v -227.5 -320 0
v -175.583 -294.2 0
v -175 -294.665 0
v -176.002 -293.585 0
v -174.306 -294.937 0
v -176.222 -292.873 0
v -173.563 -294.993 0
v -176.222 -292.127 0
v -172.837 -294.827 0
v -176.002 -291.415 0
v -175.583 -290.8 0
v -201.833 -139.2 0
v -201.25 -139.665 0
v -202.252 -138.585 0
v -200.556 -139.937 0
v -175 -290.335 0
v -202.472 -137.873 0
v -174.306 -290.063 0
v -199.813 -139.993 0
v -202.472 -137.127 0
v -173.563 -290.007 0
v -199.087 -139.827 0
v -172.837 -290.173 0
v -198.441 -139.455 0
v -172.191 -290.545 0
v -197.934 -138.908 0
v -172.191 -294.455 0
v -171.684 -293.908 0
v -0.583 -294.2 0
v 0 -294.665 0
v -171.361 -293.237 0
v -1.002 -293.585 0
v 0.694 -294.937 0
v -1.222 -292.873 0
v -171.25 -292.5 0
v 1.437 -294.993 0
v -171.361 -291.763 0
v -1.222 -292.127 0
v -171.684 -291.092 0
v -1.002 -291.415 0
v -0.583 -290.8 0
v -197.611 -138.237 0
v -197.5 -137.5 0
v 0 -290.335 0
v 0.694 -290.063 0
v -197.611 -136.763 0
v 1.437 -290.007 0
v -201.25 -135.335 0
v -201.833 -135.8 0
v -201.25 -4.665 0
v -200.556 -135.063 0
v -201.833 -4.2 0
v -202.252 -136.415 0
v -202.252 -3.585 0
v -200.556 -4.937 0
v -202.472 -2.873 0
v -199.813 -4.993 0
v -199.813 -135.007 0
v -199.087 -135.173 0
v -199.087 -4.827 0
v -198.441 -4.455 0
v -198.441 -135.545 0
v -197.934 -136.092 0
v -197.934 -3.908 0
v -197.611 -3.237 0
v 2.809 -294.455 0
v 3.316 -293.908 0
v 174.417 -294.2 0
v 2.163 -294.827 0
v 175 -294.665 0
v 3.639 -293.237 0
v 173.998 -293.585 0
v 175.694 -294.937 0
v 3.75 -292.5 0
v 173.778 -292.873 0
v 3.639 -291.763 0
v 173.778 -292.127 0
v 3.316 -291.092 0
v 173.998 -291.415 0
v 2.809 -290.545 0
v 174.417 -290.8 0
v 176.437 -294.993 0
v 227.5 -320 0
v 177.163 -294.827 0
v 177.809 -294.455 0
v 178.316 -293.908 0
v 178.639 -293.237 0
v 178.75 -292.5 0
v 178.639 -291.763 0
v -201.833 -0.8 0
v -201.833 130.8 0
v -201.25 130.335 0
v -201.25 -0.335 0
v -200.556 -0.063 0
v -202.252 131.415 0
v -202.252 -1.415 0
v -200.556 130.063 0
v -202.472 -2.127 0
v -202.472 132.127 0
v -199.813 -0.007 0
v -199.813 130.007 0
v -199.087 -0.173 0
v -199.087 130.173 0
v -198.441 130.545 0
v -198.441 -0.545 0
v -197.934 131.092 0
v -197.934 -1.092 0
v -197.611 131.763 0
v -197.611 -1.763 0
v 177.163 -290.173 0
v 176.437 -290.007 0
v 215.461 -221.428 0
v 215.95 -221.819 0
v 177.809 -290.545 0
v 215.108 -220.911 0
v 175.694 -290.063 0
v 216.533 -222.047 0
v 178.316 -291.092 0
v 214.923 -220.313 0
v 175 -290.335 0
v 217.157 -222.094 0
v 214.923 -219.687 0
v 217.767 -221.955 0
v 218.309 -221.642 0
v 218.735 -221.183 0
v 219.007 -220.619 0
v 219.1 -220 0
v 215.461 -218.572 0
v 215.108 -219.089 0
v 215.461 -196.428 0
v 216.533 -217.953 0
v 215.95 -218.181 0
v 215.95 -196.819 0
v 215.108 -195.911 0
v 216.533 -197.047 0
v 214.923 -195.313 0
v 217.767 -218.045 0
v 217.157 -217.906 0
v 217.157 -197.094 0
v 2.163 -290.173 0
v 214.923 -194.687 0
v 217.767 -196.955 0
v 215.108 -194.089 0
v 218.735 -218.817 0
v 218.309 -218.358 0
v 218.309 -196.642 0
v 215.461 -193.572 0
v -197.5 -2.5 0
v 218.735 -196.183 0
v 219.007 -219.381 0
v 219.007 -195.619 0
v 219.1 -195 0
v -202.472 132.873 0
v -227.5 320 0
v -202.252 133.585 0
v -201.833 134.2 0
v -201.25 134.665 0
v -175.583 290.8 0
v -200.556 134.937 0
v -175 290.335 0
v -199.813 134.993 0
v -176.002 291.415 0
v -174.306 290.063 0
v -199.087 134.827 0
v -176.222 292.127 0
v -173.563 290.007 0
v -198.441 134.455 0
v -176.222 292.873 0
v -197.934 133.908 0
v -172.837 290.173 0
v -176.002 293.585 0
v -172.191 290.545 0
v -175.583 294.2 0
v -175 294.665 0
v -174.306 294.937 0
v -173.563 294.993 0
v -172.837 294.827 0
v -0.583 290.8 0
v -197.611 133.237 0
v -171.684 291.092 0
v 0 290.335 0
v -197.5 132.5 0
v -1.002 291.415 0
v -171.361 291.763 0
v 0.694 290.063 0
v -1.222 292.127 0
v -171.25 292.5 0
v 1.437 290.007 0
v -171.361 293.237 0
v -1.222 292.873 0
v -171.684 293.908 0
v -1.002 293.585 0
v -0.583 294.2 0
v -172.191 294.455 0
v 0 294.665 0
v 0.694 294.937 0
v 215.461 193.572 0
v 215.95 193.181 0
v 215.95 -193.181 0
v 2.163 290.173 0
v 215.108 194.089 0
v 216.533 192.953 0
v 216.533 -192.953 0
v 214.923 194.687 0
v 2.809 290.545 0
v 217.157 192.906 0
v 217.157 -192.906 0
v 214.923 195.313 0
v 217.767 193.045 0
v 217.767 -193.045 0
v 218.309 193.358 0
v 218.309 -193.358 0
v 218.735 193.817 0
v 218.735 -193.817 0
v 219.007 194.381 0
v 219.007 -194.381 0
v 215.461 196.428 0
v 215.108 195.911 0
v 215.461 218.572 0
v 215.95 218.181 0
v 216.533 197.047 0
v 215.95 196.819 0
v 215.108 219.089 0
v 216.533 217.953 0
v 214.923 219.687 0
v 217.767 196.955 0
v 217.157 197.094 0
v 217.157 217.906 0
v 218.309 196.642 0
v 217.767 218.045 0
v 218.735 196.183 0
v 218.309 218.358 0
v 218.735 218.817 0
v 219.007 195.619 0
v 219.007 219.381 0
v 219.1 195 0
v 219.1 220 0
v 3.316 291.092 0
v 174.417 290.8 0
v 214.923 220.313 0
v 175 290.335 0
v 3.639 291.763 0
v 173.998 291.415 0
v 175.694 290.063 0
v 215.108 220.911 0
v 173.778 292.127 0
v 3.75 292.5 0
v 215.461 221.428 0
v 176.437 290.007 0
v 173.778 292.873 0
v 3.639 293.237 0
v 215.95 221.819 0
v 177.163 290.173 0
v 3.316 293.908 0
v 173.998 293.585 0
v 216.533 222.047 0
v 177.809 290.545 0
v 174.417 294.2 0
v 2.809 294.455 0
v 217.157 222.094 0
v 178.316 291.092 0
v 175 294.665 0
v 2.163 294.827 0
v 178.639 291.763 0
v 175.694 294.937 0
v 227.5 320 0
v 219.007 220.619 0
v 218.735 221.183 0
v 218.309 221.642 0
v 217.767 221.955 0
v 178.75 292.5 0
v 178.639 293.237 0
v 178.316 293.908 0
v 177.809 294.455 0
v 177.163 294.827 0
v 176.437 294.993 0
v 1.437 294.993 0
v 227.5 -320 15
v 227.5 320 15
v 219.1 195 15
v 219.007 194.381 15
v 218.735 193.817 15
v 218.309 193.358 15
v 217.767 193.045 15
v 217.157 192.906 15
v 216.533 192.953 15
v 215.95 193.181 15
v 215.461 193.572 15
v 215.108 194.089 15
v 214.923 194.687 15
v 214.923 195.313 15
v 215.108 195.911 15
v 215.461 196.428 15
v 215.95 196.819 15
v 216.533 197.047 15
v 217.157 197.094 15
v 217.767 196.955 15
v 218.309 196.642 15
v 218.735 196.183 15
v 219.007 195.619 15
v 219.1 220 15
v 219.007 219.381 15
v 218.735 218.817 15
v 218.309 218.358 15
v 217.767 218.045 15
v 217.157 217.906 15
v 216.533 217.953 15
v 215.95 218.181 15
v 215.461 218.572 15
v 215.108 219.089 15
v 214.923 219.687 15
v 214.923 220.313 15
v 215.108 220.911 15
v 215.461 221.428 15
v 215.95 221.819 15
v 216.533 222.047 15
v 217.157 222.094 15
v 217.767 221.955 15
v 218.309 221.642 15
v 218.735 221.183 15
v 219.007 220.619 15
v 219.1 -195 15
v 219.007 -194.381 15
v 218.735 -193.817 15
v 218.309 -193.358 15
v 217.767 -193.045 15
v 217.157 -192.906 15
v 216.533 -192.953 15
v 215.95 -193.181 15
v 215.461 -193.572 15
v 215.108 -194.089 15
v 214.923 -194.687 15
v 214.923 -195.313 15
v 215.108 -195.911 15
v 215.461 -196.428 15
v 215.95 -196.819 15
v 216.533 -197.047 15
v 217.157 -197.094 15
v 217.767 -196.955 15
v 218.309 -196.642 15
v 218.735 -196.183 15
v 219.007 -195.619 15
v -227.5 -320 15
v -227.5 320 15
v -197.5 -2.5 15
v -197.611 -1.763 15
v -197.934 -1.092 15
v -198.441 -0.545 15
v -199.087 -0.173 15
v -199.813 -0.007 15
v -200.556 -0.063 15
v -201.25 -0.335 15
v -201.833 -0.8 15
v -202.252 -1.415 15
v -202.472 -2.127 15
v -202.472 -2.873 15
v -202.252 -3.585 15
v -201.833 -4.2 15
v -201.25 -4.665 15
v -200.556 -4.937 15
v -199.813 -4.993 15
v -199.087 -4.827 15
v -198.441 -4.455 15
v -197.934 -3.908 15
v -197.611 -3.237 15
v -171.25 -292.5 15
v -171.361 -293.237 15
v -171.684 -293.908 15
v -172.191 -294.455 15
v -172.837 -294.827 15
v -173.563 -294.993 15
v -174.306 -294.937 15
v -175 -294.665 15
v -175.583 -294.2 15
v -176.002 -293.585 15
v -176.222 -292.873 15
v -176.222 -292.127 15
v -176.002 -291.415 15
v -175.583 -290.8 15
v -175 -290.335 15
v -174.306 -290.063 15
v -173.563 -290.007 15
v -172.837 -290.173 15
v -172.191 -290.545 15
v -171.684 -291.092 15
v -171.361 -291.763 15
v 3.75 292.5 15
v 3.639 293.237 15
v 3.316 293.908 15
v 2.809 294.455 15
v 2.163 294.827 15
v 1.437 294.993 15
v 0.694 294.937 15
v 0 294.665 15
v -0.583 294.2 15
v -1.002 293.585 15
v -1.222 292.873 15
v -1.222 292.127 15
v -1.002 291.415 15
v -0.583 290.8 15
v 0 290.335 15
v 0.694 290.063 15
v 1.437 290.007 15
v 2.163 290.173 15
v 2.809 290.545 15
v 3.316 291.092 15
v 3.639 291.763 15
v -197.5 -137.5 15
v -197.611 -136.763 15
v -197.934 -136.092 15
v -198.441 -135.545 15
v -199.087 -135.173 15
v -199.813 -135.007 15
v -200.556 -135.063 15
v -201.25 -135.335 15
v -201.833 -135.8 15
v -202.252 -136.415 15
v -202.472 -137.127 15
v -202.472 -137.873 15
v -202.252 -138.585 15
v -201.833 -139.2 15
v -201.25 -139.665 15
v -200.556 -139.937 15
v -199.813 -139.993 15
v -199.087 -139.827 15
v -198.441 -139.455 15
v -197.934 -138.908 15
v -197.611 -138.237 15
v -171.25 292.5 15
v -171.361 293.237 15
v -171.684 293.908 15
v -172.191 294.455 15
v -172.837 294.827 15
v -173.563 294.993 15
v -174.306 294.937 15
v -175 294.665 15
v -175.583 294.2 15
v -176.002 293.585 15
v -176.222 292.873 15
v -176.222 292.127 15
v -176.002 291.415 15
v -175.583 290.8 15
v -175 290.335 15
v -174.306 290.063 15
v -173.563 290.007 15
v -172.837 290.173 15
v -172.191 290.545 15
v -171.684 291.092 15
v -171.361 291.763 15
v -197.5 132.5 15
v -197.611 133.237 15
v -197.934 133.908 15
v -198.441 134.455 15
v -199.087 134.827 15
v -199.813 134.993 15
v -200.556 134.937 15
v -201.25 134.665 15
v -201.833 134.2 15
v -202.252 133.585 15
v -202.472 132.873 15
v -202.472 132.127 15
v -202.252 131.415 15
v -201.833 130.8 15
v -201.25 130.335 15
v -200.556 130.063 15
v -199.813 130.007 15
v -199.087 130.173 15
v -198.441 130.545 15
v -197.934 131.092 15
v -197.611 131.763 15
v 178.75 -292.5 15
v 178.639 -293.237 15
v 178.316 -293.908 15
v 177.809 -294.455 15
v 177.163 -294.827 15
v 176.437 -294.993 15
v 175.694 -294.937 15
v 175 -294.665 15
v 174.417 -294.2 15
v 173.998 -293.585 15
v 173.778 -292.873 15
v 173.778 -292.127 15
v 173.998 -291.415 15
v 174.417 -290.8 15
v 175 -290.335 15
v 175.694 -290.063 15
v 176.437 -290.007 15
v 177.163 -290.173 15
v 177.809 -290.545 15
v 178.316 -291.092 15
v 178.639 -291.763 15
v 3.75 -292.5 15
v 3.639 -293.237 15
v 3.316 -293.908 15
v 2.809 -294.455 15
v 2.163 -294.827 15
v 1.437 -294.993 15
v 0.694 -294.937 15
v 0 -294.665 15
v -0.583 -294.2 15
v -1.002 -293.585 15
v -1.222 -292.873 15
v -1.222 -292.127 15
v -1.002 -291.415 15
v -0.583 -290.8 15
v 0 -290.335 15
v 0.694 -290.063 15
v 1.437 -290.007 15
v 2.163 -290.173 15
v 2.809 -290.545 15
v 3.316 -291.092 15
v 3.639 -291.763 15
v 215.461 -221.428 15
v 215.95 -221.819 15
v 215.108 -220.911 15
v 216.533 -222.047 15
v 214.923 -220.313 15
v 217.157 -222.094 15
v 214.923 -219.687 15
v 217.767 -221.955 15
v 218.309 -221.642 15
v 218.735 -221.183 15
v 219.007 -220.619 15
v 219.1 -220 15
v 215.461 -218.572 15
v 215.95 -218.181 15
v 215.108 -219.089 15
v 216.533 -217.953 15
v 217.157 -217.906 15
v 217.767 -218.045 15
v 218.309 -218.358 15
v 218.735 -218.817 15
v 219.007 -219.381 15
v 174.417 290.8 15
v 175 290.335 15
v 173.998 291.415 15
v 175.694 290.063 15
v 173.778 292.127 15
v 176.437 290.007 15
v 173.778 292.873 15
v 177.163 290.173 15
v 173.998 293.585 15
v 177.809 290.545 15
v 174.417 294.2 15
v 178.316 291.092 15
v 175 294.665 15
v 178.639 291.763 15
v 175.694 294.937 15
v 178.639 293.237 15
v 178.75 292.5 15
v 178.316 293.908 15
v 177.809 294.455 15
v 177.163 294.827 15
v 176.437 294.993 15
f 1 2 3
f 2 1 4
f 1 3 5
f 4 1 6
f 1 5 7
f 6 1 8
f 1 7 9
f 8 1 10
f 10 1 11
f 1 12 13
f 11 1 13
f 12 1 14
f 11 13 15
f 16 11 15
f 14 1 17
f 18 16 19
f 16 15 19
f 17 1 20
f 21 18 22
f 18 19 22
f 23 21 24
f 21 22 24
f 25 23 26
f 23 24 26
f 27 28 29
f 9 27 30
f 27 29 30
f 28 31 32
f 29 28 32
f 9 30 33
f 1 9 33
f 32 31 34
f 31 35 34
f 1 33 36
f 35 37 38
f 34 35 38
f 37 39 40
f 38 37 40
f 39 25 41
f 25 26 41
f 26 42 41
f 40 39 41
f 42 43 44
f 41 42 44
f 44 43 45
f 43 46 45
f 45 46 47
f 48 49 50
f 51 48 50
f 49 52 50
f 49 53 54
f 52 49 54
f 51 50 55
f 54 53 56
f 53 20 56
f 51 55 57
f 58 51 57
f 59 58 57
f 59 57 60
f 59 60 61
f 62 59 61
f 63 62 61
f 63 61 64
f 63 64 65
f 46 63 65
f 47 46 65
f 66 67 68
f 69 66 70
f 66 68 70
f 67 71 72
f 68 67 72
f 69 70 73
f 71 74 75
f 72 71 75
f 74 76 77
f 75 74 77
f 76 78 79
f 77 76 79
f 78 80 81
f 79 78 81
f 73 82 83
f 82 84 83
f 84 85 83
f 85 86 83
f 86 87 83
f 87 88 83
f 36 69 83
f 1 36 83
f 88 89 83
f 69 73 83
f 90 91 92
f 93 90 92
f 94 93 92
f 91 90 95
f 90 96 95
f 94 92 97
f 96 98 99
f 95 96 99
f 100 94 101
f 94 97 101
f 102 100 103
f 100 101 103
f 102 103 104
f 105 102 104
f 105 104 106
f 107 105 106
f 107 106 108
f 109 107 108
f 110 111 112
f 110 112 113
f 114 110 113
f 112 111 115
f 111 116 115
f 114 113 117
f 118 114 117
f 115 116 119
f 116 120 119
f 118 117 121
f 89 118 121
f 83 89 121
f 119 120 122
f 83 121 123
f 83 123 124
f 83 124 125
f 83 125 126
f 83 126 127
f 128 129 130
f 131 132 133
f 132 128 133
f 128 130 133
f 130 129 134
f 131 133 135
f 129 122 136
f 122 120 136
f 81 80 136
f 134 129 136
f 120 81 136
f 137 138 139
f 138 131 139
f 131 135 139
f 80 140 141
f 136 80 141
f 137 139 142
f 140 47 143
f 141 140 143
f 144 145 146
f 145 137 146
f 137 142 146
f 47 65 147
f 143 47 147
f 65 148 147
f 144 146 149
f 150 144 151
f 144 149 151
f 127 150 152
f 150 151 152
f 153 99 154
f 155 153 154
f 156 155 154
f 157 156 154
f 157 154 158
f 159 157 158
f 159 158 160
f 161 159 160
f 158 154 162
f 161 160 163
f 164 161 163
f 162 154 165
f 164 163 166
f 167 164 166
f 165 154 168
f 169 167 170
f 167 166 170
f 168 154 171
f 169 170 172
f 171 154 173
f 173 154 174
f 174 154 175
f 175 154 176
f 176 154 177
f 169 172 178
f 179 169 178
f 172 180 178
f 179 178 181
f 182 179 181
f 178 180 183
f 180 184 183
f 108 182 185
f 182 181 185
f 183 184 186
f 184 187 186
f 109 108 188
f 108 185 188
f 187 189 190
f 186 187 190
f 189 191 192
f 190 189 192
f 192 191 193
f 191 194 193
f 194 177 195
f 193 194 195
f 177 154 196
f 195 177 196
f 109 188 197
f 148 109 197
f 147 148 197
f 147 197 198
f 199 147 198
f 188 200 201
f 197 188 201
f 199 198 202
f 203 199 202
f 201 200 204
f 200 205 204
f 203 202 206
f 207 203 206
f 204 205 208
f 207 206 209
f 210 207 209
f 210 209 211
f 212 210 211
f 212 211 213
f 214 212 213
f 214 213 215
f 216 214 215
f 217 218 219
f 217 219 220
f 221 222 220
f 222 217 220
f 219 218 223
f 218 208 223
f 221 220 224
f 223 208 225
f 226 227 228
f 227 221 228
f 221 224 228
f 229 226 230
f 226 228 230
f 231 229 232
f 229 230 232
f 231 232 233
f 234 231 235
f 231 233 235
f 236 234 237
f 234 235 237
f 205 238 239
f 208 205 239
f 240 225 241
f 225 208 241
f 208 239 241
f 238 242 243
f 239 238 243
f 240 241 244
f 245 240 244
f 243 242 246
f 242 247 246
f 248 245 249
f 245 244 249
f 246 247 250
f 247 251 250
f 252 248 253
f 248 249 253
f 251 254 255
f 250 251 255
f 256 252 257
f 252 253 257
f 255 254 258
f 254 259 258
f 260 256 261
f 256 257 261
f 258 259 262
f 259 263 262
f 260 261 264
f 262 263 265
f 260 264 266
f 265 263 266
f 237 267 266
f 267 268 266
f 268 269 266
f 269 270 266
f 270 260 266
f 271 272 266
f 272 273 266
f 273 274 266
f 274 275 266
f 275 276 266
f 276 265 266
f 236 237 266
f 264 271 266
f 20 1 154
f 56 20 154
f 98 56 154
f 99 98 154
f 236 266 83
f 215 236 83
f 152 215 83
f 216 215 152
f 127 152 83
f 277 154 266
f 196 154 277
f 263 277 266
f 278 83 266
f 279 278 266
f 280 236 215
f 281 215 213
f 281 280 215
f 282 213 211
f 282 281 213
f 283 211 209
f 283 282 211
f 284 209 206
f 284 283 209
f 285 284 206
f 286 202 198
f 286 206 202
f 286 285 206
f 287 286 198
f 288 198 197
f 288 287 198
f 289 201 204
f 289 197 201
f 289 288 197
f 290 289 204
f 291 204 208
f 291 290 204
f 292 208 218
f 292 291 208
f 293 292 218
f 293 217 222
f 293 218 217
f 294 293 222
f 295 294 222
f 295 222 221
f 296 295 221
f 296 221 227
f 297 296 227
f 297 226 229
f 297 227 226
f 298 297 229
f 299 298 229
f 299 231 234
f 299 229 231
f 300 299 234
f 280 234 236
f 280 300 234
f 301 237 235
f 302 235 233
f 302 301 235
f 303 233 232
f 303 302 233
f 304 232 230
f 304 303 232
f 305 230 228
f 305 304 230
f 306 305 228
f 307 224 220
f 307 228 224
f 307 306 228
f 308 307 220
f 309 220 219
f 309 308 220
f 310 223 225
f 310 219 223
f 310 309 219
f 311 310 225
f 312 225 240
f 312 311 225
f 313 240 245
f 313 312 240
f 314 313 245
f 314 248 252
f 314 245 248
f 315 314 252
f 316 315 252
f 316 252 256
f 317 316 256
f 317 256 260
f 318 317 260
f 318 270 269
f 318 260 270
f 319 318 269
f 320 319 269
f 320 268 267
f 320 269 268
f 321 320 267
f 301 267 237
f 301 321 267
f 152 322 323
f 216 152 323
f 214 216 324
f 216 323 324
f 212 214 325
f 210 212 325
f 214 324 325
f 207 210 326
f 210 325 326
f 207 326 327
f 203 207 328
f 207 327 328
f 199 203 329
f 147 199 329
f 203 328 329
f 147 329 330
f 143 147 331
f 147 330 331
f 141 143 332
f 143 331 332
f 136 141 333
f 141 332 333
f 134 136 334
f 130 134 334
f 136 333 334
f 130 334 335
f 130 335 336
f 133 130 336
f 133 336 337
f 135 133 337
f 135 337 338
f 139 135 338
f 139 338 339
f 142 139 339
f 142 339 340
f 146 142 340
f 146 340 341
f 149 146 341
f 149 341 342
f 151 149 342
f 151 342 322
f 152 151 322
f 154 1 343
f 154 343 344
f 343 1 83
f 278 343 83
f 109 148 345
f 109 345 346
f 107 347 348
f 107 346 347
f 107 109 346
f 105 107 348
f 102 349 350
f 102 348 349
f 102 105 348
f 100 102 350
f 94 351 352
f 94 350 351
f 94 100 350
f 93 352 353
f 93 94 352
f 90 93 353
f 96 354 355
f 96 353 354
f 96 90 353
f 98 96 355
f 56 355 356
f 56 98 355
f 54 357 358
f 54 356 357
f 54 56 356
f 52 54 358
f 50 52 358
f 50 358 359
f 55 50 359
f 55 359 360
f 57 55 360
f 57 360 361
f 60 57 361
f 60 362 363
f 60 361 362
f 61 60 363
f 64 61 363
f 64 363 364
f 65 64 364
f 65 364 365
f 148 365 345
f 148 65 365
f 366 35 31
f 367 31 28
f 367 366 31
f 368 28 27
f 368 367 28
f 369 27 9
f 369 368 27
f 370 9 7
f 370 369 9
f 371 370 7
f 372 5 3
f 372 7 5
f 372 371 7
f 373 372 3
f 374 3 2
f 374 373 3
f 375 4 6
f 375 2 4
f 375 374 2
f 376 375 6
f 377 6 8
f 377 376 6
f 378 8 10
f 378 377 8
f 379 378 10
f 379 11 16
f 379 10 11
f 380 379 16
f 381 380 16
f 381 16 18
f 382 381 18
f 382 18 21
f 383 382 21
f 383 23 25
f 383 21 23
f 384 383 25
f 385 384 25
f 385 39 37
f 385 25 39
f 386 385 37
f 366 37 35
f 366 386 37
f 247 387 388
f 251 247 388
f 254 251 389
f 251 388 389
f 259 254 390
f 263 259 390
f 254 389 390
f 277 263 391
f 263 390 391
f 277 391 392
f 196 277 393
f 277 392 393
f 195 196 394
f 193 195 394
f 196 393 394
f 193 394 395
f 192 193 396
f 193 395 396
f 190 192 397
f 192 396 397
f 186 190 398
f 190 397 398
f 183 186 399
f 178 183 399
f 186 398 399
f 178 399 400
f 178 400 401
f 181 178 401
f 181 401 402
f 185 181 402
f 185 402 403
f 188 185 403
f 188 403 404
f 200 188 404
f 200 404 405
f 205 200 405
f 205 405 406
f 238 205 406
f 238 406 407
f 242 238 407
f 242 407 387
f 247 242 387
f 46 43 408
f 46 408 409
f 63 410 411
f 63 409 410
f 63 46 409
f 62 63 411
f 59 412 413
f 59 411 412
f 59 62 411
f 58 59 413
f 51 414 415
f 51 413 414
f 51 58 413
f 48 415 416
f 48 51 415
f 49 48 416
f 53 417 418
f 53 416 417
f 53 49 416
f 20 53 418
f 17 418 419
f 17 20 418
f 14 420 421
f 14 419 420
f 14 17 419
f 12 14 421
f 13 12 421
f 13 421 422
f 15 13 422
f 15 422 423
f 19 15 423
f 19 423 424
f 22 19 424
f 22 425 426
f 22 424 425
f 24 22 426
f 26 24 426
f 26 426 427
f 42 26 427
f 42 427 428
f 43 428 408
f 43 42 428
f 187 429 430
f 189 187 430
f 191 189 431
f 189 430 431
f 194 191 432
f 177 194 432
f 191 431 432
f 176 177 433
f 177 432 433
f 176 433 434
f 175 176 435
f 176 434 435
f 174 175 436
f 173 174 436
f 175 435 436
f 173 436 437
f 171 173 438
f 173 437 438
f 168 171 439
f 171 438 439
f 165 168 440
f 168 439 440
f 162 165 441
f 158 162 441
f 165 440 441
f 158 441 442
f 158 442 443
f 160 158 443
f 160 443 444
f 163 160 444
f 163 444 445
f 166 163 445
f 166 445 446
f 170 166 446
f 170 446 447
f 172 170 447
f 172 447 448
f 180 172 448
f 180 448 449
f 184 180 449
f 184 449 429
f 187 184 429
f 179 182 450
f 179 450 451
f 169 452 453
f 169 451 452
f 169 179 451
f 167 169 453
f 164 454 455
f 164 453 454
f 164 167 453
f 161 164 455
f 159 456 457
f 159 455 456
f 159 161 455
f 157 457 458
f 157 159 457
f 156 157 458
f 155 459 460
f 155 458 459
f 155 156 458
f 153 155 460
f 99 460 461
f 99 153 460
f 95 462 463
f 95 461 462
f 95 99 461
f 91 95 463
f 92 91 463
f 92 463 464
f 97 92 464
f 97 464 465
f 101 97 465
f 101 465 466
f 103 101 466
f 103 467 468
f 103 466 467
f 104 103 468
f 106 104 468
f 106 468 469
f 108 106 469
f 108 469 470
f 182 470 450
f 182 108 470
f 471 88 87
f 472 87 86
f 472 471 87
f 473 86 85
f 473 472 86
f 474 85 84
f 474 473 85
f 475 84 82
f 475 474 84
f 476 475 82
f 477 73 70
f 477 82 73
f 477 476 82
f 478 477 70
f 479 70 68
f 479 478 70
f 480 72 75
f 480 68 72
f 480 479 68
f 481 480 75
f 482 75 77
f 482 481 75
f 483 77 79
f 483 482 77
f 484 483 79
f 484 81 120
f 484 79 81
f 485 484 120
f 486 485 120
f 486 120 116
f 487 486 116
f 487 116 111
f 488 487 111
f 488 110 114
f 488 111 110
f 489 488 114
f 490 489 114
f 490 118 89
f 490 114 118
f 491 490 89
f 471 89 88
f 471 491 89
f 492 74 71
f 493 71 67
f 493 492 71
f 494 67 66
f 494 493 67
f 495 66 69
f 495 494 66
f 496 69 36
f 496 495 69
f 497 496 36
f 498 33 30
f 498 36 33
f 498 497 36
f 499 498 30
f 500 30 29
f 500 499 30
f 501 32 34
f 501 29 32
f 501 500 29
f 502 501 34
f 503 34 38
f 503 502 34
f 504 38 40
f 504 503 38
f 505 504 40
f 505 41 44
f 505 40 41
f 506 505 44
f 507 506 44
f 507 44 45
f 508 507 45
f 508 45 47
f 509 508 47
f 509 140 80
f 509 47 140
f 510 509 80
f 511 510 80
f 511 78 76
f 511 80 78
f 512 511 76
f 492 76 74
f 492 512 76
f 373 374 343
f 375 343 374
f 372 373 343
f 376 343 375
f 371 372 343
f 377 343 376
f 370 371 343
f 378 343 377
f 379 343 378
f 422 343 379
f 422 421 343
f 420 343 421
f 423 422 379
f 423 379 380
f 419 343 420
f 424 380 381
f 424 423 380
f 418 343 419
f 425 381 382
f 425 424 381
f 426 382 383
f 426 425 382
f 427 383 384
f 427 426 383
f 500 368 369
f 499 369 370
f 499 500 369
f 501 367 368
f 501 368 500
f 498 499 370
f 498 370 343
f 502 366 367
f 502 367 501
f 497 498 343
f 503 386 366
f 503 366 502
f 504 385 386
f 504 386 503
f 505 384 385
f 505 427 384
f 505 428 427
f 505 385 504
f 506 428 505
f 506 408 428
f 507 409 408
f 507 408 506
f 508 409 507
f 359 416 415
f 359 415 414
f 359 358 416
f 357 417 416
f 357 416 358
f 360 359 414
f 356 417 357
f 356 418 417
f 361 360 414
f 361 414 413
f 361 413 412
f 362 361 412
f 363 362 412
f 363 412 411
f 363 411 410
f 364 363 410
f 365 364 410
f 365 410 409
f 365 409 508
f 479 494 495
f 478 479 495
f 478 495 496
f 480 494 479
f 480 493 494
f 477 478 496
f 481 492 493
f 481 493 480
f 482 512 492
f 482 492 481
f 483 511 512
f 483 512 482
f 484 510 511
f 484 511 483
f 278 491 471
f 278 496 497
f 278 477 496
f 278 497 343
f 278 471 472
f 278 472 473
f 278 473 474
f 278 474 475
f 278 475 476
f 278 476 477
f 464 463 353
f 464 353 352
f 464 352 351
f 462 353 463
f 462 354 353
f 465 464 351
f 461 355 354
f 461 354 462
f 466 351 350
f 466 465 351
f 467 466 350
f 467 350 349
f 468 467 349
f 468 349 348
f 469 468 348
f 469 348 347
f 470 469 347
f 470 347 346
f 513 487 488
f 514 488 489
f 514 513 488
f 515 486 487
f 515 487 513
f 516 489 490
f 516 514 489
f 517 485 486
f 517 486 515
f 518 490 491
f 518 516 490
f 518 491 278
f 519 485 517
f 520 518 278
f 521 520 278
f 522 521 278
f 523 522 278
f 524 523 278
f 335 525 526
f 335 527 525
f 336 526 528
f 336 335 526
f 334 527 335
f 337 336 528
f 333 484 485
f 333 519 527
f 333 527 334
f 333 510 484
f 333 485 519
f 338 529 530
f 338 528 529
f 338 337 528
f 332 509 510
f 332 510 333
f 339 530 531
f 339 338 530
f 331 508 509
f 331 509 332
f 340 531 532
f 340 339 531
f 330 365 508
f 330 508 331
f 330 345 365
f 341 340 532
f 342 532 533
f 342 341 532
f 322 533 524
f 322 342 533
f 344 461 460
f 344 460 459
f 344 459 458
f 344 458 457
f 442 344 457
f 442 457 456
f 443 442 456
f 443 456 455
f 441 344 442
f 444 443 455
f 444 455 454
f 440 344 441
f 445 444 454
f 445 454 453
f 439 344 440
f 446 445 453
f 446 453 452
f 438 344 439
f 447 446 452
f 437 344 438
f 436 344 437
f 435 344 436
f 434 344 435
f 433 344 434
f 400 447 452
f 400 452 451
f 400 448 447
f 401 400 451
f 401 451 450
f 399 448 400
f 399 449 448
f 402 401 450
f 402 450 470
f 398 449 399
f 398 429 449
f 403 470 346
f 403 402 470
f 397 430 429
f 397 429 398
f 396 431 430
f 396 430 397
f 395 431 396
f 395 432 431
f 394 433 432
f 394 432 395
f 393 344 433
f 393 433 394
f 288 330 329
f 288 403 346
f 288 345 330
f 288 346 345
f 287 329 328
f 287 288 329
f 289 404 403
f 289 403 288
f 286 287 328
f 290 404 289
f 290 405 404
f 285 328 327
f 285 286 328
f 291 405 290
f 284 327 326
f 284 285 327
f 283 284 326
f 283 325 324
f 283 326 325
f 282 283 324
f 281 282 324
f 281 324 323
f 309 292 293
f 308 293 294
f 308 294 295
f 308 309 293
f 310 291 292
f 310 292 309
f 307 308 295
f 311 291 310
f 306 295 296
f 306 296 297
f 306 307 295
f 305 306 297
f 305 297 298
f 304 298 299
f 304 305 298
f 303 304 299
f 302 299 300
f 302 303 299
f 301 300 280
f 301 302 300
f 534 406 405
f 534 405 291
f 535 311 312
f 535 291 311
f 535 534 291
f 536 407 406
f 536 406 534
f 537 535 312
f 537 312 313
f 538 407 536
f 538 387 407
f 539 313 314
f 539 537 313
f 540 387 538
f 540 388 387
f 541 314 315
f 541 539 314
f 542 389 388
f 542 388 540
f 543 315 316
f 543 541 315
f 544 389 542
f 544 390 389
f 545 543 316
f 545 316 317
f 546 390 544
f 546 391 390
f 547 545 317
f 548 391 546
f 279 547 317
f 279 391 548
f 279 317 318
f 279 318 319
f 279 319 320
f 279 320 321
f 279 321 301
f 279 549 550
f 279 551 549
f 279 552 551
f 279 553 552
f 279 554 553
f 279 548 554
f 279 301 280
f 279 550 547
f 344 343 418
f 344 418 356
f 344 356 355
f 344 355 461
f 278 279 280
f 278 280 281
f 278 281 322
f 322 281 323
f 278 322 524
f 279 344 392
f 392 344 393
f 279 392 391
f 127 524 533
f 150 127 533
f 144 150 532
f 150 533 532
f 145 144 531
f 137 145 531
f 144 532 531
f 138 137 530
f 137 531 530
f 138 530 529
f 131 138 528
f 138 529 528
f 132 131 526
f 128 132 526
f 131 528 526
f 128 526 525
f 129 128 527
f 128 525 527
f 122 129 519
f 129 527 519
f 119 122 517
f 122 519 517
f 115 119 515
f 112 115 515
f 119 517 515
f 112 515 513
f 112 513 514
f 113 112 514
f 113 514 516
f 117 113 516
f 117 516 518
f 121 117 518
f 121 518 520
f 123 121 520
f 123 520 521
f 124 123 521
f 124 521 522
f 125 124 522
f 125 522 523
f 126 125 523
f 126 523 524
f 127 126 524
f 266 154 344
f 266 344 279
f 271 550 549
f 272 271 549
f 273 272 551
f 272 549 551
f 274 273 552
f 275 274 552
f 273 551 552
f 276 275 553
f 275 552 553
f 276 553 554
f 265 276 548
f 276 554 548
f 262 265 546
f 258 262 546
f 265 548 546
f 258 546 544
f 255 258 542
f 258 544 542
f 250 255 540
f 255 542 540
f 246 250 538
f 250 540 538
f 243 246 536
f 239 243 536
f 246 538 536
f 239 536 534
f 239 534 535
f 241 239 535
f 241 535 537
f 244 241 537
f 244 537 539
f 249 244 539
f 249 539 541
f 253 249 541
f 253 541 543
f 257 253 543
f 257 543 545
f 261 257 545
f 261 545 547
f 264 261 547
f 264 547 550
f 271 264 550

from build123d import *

# Parameters (mm, degrees)
SKETCH_1_W               = 455
SKETCH_1_H               = 640
EXTRUDE_1_DEPTH          = 15
CUT_EXTRUDE_1_DEPTH      = 393.913794617
CUT_EXTRUDE_1_DEPTH_BACK = 393.913794617
SKETCH_2_R               = 2.5
SKETCH_2_3_R             = 2.5
CUT_EXTRUDE_2_DEPTH      = 393.913794617
SKETCH_3_R               = 2.1
CUT_EXTRUDE_3_DEPTH      = 393.913794617


with BuildPart() as part:
    # ｽｹｯﾁ1 → ﾎﾞｽ - 押し出し1 (new body)
    with BuildSketch(Plane.XY):
        Rectangle(SKETCH_1_W, SKETCH_1_H)
    extrude(amount=EXTRUDE_1_DEPTH)

    # ｽｹｯﾁ2 → ｶｯﾄ - 押し出し1 (cut, two sides: drawn at the far end of the back side and taken through both)
    with BuildSketch(Plane.XY.offset(15).offset(-CUT_EXTRUDE_1_DEPTH_BACK)):
        with Locations((-200, 132.5)):
            Circle(SKETCH_2_R)
        with Locations((-200, -2.5)):
            Circle(SKETCH_2_R)
        with Locations((-200, -137.5)):
            Circle(SKETCH_2_R)
    extrude(amount=CUT_EXTRUDE_1_DEPTH + CUT_EXTRUDE_1_DEPTH_BACK, mode=Mode.SUBTRACT)

    # ｽｹｯﾁ2<3> → ｶｯﾄ - 押し出し2 (cut, through all)
    with BuildSketch(Plane.XY.offset(15)):
        with Locations((1.25, 292.5)):
            Circle(SKETCH_2_3_R)
        with Locations((-173.75, 292.5)):
            Circle(SKETCH_2_3_R)
        with Locations((176.25, 292.5)):
            Circle(SKETCH_2_3_R)
    cut_extrude_2 = extrude(amount=-CUT_EXTRUDE_2_DEPTH, mode=Mode.SUBTRACT)

    # ﾐﾗｰ1: ｶｯﾄ - 押し出し2 across plane
    add(cut_extrude_2.mirror(Plane.ZX), mode=Mode.SUBTRACT)

    # ｽｹｯﾁ3 → ｶｯﾄ - 押し出し3 (cut, through all)
    with BuildSketch(Plane.XY.offset(15)):
        with Locations((217, -220)):
            Circle(SKETCH_3_R)
        with Locations((217, -195)):
            Circle(SKETCH_3_R)
    cut_extrude_3 = extrude(amount=-CUT_EXTRUDE_3_DEPTH, mode=Mode.SUBTRACT)

    # ﾐﾗｰ2: ｶｯﾄ - 押し出し3 across plane
    add(cut_extrude_3.mirror(Plane.ZX), mode=Mode.SUBTRACT)


solid = part.part
